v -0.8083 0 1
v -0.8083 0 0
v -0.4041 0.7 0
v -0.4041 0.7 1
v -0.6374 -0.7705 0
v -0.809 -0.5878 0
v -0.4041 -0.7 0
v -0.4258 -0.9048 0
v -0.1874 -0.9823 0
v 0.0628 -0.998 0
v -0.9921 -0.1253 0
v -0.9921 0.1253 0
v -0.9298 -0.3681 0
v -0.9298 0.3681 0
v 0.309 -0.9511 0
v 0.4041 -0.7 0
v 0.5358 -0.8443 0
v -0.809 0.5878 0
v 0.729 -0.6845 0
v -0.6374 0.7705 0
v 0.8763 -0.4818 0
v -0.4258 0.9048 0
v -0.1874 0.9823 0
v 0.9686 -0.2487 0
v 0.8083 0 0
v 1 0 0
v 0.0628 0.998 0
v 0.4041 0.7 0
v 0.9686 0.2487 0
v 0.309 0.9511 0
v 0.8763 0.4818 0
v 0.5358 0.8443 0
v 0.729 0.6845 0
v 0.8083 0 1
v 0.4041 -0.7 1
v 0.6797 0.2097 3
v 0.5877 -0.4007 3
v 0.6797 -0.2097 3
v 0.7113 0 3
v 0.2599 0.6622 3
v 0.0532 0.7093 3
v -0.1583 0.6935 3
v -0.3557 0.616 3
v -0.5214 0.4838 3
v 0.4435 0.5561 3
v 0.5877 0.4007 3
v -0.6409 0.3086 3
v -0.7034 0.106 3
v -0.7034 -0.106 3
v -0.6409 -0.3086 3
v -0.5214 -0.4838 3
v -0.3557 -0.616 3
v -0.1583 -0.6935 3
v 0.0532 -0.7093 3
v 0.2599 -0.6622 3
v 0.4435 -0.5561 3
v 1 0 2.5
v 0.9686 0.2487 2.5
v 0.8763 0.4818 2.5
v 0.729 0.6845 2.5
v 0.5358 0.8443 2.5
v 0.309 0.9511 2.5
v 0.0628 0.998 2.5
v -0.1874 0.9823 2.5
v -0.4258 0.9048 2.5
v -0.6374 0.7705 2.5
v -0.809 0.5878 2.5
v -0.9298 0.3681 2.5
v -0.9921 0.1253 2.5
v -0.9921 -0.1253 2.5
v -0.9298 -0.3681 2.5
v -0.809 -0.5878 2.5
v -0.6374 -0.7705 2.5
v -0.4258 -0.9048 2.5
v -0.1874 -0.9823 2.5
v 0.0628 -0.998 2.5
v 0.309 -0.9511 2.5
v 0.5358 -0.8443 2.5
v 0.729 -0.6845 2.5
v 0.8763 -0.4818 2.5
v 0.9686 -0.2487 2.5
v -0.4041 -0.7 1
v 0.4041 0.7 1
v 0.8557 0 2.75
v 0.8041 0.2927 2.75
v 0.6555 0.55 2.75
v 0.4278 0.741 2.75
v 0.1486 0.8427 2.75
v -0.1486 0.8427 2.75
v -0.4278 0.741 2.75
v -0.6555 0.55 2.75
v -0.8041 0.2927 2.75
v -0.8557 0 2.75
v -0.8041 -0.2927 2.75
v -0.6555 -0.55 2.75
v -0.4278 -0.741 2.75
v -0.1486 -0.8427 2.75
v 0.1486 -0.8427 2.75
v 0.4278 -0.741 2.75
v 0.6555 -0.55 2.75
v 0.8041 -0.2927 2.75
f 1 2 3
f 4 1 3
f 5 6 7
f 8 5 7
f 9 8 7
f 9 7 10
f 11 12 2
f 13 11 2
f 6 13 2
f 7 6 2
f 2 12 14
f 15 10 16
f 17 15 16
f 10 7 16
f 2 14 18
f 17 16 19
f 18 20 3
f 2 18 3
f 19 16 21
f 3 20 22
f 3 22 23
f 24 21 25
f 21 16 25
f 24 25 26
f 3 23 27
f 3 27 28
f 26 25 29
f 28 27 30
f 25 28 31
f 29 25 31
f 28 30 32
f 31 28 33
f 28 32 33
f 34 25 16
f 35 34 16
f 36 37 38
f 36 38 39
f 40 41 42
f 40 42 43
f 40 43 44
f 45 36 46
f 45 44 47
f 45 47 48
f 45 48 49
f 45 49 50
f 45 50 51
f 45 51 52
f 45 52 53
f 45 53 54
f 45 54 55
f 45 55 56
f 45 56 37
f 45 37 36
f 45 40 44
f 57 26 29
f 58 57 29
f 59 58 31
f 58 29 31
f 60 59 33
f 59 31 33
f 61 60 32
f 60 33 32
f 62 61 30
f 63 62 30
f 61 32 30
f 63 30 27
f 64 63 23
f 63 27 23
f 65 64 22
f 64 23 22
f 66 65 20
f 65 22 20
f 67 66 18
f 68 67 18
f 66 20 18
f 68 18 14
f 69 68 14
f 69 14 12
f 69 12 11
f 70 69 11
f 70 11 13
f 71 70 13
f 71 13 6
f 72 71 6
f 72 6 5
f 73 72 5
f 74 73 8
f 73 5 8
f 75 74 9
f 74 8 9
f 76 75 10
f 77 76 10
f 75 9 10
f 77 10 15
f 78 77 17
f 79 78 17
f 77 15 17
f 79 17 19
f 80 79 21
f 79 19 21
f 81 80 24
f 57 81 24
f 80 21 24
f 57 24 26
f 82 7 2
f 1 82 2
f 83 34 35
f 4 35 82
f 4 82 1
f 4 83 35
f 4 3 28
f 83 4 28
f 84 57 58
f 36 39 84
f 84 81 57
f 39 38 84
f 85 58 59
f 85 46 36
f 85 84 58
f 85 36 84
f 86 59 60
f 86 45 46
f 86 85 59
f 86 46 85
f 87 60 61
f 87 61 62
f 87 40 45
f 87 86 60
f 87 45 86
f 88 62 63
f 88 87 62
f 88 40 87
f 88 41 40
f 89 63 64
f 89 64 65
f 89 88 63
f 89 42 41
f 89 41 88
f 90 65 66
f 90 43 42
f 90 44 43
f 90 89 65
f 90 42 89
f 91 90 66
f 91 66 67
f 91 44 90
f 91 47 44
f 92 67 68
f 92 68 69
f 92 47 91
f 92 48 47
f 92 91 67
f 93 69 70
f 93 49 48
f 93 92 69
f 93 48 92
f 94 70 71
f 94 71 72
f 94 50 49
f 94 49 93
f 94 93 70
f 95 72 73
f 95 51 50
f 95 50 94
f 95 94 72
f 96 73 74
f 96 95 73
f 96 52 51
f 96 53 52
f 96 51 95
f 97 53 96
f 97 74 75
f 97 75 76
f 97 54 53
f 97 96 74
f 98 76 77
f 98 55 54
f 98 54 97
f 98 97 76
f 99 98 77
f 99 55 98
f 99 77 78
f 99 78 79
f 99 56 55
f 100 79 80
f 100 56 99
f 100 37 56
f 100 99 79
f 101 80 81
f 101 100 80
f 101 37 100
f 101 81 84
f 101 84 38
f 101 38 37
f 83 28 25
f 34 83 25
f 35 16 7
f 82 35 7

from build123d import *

# Parameters (mm, degrees)
SKETCH1_R           = 1
BOSS_EXTRUDE1_DEPTH = 3
CHAMFER1_SIZE       = 0.5
CHAMFER1_SIZE2      = 0.288675135
CUT_EXTRUDE1_DEPTH  = 1


with BuildPart() as part:
    # Sketch1 → Boss-Extrude1 (new body)
    with BuildSketch(Plane.XY):
        Circle(SKETCH1_R)
    extrude(amount=BOSS_EXTRUDE1_DEPTH)

    # Chamfer1
    chamfer1_edges = [part.edges().sort_by_distance(p)[0] for p in [
        (-1, 0, 3),
    ]]
    chamfer1_side = [part.faces().sort_by_distance(p)[0] for p in [
        (-1, 0, 1.5),
    ]]
    chamfer(chamfer1_edges, length=CHAMFER1_SIZE, length2=CHAMFER1_SIZE2, reference=chamfer1_side[0])

    # Sketch2 → Cut-Extrude1 (cut)
    with BuildSketch(Plane(origin=(0, 0, 0), x_dir=(-1, 0, 0), z_dir=(0, 0, -1))):
        Polygon((0.808290377, 0), (0.404145188, 0.7), (-0.404145188, 0.7), (-0.808290377, 0), (-0.404145188, -0.7), (0.404145188, -0.7), align=None)
    extrude(amount=-CUT_EXTRUDE1_DEPTH, mode=Mode.SUBTRACT)


solid = part.part
